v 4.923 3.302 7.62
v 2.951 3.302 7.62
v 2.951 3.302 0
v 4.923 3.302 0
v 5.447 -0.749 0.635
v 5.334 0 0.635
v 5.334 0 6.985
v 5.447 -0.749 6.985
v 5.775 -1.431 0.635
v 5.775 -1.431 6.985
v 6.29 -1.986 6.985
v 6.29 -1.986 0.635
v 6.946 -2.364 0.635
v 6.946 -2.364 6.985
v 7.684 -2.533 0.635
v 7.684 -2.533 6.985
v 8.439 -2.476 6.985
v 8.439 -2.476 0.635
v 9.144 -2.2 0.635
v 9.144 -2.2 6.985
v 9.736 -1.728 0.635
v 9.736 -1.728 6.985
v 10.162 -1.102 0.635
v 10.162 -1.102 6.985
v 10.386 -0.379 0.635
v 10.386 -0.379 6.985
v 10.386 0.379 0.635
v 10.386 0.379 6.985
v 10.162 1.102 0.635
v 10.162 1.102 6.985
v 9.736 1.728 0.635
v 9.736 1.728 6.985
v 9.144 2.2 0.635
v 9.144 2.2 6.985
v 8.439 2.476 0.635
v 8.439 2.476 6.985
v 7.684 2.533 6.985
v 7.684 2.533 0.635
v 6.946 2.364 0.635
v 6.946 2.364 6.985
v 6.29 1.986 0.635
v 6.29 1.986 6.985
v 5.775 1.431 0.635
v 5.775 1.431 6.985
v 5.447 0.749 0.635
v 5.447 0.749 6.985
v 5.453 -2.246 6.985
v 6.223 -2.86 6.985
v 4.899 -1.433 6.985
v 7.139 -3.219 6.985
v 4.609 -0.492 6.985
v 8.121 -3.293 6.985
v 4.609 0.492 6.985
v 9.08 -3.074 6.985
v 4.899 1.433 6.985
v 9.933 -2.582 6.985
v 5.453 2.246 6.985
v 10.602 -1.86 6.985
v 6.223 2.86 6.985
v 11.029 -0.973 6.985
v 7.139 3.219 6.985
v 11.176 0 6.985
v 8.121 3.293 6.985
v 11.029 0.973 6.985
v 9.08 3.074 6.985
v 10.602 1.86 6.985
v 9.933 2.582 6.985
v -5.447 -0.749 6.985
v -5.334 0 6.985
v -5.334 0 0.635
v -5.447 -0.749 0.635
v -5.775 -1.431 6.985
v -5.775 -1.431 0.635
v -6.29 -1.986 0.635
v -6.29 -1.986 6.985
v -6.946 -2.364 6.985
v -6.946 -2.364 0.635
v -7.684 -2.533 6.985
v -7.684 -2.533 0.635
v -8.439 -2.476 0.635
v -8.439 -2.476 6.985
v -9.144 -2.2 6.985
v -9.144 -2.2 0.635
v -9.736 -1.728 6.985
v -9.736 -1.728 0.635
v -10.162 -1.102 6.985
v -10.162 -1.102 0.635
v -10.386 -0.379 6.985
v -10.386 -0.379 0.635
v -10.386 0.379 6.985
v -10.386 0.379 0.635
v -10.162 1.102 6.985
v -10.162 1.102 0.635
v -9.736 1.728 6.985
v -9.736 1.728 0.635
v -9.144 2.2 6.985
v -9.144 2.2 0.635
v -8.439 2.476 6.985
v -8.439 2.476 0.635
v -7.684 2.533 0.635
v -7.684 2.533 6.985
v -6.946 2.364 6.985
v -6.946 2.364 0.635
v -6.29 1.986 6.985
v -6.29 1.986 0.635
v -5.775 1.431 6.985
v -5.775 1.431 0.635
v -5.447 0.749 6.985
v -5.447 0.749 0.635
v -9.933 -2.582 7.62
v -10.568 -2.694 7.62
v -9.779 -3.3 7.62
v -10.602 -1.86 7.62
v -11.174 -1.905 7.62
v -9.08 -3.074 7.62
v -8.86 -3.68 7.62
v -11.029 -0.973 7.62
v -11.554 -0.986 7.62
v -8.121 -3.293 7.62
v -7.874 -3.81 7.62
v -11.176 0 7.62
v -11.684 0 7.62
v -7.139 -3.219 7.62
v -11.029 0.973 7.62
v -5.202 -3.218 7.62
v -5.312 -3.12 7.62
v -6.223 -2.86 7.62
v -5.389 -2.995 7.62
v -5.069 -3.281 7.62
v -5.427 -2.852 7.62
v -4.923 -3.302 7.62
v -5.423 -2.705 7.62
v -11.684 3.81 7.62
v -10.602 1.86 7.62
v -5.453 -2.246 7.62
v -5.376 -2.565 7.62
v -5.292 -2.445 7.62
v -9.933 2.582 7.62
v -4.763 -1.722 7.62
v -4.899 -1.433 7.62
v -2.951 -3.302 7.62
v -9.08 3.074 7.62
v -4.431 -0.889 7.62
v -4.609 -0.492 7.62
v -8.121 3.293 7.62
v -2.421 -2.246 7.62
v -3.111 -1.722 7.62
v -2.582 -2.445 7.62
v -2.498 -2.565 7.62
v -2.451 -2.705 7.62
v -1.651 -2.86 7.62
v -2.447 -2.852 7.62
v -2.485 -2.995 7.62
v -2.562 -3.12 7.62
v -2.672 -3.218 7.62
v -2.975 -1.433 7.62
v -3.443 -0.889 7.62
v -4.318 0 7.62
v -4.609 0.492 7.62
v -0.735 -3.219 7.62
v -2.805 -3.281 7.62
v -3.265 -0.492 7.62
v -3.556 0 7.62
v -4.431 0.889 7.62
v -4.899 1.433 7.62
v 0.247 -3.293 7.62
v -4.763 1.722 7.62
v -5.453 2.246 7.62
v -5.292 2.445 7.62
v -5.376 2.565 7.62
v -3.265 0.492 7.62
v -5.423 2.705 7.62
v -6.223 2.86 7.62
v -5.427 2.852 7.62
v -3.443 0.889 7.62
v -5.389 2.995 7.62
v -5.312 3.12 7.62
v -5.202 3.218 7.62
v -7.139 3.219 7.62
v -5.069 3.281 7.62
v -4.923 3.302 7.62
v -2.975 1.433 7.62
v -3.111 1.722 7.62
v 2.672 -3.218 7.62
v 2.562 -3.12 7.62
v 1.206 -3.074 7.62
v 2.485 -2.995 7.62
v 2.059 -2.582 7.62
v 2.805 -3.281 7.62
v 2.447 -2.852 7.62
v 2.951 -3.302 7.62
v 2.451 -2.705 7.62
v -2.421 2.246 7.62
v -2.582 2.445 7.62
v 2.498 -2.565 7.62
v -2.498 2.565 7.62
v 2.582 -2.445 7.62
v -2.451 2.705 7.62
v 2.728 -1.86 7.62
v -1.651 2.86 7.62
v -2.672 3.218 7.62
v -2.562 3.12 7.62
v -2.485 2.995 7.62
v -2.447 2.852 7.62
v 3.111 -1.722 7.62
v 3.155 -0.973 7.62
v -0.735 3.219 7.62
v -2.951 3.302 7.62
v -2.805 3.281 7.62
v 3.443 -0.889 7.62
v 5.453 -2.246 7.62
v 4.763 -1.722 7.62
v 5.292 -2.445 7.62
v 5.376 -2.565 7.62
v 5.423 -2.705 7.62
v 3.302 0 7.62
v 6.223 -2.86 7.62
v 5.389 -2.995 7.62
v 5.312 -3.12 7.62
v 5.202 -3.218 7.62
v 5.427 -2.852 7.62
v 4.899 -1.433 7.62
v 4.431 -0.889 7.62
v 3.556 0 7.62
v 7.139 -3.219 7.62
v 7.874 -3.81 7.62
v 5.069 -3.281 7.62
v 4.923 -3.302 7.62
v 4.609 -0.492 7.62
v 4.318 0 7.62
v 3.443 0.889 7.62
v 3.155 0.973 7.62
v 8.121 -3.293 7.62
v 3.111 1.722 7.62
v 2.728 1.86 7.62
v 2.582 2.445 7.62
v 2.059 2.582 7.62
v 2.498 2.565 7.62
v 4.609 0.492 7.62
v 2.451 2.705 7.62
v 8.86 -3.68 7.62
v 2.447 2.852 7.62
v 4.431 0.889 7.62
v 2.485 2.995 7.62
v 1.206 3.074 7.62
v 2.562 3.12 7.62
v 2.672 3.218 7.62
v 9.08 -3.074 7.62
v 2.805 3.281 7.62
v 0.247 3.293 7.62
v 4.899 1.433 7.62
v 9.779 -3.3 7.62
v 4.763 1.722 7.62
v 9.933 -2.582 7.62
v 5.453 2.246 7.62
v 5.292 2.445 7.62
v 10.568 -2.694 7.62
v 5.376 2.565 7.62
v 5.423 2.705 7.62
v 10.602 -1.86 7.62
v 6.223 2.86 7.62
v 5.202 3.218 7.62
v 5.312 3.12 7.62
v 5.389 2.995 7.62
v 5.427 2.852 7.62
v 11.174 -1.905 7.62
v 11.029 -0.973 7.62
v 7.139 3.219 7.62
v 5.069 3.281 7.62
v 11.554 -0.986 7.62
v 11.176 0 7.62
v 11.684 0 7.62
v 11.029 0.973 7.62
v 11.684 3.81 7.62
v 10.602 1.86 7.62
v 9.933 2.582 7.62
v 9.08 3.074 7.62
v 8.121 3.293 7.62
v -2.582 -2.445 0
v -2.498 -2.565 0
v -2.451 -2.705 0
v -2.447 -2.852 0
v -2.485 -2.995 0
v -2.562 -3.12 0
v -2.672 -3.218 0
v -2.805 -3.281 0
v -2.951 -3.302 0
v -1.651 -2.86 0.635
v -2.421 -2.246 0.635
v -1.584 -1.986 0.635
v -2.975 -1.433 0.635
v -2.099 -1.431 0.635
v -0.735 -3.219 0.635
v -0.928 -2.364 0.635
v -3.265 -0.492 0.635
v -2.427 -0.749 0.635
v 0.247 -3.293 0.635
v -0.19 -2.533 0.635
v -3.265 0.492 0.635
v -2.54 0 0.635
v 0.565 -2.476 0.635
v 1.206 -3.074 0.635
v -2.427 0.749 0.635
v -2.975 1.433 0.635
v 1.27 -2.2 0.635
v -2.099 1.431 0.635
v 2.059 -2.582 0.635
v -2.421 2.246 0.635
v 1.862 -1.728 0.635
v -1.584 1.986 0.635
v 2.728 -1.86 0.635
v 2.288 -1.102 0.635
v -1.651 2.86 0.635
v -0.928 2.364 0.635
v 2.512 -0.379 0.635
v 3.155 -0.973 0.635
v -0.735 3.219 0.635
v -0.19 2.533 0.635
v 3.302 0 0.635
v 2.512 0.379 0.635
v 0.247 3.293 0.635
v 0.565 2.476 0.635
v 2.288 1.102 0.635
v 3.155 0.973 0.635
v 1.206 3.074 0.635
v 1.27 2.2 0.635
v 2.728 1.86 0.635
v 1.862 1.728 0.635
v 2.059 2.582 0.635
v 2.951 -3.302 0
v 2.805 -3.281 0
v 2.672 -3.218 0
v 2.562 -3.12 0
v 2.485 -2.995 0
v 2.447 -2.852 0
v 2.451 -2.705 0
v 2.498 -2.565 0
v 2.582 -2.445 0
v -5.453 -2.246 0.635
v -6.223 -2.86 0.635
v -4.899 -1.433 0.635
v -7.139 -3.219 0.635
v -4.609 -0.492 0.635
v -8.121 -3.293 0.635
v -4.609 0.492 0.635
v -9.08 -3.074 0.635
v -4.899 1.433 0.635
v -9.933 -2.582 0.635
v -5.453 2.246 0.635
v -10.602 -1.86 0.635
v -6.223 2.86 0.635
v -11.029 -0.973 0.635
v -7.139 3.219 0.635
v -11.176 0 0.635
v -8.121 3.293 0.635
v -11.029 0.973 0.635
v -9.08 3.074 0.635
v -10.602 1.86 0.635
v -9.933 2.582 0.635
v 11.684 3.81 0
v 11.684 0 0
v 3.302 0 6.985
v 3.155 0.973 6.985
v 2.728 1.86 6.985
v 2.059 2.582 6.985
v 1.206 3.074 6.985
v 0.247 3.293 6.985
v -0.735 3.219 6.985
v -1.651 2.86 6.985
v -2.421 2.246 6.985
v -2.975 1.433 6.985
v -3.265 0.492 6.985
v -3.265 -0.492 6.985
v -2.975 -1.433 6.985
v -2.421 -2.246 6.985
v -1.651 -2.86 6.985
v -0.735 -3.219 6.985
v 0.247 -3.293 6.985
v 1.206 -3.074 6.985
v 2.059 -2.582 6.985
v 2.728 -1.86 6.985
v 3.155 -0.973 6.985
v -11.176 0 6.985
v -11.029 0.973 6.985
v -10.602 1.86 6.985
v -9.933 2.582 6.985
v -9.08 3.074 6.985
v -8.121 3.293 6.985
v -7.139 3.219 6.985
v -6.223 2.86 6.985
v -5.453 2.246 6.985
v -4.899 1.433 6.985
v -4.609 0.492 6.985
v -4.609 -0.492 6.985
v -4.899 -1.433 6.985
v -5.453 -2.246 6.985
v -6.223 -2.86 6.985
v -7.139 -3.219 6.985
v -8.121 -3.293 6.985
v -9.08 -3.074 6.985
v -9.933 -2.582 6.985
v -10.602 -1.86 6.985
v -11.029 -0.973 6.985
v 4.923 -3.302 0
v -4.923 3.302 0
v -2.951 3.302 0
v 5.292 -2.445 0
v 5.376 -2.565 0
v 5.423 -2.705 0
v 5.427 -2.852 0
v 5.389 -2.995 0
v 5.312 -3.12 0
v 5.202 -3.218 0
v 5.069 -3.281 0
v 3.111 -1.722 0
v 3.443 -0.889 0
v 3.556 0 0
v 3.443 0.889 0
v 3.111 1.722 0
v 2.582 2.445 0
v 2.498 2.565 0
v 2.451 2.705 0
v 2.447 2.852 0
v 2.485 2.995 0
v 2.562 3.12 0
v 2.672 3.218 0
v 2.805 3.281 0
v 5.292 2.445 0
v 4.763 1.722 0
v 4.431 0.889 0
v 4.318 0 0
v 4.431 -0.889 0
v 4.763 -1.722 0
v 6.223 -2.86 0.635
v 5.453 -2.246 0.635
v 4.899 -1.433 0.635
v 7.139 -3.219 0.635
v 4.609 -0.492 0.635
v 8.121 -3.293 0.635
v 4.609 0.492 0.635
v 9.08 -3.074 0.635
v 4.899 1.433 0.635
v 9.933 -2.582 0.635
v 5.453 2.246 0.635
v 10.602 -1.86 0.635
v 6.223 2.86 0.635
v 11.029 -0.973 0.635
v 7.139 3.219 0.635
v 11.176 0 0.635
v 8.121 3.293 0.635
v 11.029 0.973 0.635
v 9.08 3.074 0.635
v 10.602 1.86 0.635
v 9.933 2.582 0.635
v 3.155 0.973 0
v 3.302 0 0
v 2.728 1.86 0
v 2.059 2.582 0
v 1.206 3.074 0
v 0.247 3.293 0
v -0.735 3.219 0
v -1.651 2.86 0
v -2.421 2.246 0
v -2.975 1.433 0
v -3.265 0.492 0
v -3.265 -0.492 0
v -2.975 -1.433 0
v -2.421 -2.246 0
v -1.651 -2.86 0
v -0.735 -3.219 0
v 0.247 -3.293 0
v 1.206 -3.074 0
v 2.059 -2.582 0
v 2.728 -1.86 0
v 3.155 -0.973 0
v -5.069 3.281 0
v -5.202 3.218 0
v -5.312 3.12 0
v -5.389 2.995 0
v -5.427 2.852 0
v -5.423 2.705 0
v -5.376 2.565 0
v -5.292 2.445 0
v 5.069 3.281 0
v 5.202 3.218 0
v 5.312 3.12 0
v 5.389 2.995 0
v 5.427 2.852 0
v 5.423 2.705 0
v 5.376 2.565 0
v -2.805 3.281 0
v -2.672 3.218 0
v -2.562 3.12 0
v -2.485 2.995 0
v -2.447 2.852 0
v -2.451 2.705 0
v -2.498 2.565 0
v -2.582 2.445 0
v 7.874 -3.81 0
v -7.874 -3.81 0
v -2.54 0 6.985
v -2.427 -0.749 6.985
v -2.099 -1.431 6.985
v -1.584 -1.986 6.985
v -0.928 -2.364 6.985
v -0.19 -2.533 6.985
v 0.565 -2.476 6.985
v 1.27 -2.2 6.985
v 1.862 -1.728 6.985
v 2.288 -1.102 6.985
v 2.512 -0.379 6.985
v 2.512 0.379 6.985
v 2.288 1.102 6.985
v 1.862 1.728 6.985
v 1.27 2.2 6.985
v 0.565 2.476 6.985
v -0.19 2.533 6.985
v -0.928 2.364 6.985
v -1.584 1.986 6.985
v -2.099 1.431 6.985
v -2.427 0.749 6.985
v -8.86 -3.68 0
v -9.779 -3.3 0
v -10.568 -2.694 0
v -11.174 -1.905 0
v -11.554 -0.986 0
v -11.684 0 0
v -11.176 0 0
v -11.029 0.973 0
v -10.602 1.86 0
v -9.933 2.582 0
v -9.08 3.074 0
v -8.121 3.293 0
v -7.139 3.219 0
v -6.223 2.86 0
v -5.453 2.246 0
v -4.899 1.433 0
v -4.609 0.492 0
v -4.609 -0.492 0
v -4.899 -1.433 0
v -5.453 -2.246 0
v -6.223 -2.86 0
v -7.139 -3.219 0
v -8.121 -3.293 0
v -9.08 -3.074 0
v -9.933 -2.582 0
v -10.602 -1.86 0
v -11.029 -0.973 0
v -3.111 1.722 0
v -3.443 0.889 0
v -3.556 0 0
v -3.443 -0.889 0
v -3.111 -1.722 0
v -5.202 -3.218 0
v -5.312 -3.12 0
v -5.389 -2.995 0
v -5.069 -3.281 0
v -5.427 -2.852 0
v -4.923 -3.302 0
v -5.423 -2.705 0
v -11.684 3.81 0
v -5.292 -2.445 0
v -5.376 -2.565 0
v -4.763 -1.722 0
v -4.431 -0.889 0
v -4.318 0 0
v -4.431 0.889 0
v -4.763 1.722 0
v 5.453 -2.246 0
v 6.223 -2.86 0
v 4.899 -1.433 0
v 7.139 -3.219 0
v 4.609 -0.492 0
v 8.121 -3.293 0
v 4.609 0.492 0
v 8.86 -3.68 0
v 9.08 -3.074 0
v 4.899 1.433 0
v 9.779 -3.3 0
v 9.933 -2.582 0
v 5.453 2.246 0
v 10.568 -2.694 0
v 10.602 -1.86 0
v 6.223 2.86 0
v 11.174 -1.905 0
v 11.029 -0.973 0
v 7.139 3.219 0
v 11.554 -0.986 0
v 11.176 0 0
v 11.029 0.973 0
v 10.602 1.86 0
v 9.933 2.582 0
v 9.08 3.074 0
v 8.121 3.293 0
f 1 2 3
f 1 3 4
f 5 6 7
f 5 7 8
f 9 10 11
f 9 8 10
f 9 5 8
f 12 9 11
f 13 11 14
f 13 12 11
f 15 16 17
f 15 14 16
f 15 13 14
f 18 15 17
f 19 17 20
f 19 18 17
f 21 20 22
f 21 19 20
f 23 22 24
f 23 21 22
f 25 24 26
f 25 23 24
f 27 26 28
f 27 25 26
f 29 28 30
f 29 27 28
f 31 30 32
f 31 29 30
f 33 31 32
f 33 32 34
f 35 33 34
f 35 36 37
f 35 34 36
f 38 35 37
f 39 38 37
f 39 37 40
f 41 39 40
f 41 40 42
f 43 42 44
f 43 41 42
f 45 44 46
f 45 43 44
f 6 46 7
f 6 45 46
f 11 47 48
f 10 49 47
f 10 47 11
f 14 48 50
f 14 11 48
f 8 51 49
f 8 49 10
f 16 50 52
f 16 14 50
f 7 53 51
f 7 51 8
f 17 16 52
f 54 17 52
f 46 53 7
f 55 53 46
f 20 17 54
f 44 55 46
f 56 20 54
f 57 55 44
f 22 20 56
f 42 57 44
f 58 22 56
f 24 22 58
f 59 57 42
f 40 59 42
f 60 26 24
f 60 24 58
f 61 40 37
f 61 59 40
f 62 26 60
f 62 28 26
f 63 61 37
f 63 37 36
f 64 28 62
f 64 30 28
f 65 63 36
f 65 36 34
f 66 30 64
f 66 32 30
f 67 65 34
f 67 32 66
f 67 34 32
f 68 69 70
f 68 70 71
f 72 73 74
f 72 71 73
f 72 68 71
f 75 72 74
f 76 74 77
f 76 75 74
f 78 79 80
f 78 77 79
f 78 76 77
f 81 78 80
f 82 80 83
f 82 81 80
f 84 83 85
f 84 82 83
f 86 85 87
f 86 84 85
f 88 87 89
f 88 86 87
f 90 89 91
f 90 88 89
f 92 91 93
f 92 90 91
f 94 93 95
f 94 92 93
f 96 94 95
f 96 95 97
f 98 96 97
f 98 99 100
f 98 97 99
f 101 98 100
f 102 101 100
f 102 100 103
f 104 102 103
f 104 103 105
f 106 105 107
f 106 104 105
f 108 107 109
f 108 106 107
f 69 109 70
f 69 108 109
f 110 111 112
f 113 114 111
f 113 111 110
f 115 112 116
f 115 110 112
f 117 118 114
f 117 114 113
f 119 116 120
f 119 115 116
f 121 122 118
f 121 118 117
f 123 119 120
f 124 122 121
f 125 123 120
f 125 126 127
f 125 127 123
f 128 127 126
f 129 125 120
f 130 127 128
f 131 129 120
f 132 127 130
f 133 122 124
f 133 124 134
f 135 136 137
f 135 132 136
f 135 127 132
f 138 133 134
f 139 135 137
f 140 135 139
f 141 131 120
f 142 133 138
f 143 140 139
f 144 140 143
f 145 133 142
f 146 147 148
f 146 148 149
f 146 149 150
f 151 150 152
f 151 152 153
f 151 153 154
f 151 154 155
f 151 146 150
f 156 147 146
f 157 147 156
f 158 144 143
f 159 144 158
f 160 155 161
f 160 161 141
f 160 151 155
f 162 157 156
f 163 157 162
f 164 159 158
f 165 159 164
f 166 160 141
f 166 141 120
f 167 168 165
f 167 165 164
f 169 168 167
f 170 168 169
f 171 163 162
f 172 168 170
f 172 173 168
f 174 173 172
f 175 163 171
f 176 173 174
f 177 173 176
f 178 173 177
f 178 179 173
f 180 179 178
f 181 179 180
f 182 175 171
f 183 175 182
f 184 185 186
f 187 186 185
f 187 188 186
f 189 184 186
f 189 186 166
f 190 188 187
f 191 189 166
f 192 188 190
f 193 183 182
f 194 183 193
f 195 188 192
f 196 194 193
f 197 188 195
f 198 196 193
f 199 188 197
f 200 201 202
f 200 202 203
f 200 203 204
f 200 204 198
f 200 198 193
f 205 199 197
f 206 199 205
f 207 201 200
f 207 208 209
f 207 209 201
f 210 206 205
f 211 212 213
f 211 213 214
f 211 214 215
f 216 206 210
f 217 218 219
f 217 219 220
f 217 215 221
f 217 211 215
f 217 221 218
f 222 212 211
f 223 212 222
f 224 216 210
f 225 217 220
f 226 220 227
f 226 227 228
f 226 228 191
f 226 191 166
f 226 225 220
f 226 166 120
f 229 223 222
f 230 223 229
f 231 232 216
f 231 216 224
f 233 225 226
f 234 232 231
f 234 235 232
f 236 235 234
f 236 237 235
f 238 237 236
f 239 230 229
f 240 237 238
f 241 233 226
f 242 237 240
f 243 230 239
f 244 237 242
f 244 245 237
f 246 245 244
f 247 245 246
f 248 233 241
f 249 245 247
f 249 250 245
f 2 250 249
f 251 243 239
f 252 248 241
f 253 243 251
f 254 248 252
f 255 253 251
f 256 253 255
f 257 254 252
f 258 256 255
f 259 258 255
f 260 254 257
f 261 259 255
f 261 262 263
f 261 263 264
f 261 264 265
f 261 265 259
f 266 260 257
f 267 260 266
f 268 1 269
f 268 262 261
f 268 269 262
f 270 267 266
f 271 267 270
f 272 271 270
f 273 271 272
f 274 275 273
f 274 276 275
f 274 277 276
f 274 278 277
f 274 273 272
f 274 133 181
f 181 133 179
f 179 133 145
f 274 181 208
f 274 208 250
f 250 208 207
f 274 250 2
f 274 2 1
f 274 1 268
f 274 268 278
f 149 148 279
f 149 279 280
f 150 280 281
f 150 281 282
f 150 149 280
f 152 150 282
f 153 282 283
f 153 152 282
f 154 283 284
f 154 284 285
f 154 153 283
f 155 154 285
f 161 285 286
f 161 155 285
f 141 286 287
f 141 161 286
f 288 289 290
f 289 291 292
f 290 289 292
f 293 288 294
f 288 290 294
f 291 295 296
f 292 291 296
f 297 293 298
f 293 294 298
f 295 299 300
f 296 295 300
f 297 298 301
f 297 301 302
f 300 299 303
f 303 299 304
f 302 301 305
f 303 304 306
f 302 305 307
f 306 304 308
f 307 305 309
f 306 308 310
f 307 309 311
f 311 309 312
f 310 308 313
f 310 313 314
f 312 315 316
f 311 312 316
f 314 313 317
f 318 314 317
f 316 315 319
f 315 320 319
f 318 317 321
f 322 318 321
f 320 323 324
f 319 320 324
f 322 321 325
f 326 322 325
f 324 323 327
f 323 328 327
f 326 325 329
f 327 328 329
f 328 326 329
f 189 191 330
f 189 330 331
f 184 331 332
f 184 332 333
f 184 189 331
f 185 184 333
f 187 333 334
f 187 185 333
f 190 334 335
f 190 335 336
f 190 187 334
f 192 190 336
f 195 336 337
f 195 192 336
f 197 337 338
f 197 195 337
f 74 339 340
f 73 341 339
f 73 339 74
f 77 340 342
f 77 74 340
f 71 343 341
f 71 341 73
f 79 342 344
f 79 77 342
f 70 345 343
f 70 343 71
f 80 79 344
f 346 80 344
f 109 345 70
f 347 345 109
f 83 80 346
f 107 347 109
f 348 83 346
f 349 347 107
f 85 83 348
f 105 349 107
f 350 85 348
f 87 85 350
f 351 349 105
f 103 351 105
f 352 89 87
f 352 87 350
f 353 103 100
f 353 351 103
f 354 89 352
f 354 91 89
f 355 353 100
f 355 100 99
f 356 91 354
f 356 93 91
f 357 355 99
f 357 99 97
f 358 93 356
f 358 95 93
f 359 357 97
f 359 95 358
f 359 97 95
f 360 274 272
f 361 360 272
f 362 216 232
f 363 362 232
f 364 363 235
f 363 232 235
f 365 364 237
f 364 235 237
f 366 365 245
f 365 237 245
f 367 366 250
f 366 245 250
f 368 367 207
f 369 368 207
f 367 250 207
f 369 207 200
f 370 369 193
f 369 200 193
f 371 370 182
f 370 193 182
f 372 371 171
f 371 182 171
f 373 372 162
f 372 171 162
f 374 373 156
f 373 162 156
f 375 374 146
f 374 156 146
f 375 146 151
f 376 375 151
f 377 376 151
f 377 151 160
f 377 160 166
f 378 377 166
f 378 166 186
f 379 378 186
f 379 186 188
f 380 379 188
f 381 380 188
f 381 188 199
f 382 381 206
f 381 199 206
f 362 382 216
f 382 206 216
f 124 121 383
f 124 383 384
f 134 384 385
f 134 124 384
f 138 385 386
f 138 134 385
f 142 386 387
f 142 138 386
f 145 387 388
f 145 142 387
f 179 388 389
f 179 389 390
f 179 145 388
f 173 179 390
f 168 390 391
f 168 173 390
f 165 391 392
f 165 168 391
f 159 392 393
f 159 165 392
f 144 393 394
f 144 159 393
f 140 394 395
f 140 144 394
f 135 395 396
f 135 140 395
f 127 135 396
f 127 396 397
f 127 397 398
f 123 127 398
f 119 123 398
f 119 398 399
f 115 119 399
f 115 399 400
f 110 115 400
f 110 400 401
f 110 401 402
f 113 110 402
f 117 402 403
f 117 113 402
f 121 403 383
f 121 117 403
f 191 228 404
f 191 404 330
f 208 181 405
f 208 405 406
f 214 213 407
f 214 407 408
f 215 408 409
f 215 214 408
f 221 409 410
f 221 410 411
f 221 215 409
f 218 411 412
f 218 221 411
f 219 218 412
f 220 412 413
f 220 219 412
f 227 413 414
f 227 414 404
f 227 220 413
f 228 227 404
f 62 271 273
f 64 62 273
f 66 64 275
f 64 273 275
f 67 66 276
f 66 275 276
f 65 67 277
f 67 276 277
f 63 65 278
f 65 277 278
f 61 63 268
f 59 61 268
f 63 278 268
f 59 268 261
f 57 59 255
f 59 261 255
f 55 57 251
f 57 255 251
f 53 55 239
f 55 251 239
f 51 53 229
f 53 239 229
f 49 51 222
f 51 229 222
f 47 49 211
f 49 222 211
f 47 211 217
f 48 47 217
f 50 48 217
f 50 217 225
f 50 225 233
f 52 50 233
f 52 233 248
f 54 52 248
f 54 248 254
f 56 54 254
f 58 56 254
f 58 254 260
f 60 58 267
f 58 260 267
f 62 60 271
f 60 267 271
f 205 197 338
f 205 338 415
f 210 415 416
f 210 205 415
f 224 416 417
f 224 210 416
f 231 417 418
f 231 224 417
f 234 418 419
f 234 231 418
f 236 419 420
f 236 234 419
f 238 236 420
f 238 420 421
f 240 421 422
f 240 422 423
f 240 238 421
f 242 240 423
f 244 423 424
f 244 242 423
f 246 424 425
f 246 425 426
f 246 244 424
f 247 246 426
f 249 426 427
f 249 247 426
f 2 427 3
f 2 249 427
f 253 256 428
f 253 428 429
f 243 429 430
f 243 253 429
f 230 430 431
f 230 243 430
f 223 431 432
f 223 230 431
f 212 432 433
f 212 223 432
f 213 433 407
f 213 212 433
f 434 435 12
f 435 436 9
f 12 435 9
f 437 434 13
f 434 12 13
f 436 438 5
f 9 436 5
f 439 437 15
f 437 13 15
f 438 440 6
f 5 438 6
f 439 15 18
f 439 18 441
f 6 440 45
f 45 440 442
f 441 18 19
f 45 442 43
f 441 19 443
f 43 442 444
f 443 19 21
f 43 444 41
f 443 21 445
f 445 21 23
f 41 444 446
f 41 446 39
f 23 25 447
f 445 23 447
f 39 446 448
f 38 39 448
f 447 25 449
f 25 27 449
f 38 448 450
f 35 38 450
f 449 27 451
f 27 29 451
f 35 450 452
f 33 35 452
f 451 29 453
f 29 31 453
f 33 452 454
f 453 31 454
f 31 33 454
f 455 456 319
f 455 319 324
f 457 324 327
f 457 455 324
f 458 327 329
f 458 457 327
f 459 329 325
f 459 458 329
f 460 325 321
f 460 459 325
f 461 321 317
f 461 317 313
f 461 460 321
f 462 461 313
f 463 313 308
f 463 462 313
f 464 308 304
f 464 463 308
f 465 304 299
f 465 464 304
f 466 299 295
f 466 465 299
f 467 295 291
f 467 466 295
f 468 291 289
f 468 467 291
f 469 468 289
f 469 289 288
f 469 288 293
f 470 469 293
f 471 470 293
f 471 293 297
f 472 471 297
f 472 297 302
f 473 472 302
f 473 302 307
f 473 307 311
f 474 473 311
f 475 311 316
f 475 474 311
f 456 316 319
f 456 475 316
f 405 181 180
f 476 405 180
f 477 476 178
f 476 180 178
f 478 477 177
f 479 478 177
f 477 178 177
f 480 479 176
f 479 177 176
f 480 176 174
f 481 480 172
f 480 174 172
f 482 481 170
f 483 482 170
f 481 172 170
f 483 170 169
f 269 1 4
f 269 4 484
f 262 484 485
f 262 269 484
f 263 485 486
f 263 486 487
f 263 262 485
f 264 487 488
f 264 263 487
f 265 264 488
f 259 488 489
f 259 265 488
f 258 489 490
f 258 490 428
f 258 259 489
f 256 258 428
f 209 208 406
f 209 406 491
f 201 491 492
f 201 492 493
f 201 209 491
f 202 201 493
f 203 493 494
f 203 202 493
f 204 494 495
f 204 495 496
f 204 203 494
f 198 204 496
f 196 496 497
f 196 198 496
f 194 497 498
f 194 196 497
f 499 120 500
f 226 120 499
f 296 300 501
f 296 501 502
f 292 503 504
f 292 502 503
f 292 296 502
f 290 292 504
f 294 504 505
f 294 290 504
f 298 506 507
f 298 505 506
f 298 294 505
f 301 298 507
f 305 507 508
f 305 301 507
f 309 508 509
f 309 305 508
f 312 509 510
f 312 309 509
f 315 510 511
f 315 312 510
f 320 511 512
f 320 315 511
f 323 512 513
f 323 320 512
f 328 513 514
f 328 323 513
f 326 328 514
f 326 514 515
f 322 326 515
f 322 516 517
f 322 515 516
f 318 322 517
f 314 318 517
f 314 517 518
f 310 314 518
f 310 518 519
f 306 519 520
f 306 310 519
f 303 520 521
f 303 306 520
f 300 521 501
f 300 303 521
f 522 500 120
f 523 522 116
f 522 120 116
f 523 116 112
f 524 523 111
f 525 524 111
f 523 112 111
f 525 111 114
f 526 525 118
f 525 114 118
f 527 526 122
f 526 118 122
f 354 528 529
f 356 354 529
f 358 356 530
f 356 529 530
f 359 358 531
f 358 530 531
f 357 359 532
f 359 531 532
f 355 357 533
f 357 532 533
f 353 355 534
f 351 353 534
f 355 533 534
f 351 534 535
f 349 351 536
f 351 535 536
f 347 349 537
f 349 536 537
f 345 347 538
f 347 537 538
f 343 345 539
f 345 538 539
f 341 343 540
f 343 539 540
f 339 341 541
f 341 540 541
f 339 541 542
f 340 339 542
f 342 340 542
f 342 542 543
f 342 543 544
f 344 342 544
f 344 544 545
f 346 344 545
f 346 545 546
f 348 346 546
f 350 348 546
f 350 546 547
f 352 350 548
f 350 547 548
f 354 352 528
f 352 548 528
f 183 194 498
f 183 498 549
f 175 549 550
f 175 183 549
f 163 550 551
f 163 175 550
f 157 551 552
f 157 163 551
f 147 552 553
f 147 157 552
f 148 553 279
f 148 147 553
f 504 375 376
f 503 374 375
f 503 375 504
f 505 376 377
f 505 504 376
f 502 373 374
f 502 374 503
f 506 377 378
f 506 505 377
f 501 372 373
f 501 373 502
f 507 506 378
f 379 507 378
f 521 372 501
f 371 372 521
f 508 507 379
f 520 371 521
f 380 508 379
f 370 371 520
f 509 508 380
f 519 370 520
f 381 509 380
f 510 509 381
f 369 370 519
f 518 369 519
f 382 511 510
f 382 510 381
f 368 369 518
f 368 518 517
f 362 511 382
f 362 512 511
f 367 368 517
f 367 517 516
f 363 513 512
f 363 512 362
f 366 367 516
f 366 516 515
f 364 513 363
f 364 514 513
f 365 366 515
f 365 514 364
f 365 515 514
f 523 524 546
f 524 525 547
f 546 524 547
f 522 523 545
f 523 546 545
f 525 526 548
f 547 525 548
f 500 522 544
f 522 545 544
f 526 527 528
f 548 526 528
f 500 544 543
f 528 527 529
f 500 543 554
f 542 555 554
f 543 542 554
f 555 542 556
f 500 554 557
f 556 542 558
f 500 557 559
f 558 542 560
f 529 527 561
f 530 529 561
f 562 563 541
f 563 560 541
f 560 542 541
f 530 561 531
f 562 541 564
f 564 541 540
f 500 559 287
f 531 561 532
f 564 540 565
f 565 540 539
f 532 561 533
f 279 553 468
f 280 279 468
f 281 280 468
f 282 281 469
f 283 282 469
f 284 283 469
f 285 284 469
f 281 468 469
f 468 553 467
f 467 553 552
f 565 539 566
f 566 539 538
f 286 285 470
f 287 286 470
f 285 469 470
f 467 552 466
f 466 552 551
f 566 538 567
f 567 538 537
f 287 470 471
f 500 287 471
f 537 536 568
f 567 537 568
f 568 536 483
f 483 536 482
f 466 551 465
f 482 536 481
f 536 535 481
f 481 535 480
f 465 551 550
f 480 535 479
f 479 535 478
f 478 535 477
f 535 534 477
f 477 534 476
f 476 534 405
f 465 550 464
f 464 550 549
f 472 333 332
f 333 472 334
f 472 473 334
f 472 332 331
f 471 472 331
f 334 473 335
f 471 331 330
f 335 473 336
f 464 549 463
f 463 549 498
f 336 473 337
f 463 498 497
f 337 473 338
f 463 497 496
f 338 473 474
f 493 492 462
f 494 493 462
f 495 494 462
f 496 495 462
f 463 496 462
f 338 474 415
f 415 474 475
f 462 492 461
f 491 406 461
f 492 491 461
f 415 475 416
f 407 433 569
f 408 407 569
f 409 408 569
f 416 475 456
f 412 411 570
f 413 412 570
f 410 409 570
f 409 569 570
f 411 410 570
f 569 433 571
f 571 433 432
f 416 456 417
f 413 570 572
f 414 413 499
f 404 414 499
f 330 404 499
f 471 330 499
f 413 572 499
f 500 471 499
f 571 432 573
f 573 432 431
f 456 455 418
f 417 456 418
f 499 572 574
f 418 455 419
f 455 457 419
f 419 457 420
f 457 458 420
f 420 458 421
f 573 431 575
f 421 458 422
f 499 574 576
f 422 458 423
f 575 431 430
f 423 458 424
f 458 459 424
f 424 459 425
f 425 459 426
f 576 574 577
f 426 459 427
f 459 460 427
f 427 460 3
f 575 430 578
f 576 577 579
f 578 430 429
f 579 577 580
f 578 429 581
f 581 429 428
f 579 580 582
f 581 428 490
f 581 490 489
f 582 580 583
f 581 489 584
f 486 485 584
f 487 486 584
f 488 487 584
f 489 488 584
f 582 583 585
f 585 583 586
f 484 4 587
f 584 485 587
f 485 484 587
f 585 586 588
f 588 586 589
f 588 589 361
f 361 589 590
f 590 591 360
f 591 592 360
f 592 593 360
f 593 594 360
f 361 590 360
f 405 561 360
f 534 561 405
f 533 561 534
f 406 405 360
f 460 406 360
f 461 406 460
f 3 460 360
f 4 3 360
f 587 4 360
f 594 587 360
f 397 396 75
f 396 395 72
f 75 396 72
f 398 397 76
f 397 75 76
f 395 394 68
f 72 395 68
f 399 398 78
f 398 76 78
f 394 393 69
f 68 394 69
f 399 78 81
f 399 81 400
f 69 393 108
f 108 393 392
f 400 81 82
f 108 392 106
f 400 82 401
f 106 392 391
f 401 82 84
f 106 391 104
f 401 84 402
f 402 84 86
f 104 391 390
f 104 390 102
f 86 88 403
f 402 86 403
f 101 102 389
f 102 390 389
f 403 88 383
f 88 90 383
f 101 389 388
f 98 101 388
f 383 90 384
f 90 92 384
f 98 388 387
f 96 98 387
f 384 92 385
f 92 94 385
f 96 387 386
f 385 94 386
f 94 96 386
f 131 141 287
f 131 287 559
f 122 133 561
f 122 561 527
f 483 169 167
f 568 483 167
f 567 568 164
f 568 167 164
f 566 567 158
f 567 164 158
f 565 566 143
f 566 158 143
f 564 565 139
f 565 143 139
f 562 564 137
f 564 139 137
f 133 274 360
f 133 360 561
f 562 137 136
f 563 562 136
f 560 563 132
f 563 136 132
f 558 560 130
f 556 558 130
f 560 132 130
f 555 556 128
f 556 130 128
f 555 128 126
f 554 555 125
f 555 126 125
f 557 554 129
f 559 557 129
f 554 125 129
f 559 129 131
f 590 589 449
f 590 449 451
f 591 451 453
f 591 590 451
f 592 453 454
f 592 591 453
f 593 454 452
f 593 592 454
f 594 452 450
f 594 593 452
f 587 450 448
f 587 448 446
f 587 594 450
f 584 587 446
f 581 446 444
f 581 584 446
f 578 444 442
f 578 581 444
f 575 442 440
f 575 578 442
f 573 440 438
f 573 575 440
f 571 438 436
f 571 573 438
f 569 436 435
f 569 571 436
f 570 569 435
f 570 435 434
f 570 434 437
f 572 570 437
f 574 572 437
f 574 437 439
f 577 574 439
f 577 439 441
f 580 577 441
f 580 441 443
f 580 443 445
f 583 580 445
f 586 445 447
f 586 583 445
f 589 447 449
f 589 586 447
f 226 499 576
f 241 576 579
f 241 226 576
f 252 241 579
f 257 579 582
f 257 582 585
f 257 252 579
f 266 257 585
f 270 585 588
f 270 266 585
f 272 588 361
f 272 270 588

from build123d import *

# Parameters (mm, degrees)
SKETCH1_R           = 3.302
SKETCH1_R_2         = 2.54
BOSS_EXTRUDE1_DEPTH = 3.81
SKETCH1_7_R         = 2.54
BOSS_EXTRUDE2_DEPTH = 3.81
SKETCH2_R           = 3.302
CUT_EXTRUDE1_DEPTH  = 0.635
BOSS_EXTRUDE3_DEPTH = 7.62


with BuildPart() as part:
    # Sketch1 → Boss-Extrude1 (new body)
    with BuildSketch(Plane.XY):
        with BuildLine():
            Line((3.937, -3.81), (7.874, -3.81))
            ThreePointArc((7.874, -3.81), (11.684, 0), (7.874, 3.81))
            Line((7.874, 3.81), (3.937, 3.81))
            Line((3.937, 3.81), (3.937, 3.302))
            Line((3.937, 3.302), (4.92278669, 3.302))
            ThreePointArc((4.92278669, 3.302), (5.389414486, 2.994804631), (5.291688354, 2.44475))
            ThreePointArc((5.291688354, 2.44475), (4.318, 0), (5.291688354, -2.44475))
            ThreePointArc((5.291688354, -2.44475), (5.389414486, -2.994804631), (4.92278669, -3.302))
            Line((4.92278669, -3.302), (3.937, -3.302))
            Line((3.937, -3.302), (3.937, -3.81))
        make_face()
        with Locations((7.874, 0)):
            Circle(SKETCH1_R, mode=Mode.SUBTRACT)
        with Locations((7.874, 0)):
            Circle(SKETCH1_R)
        with Locations(Location((7.874, 0, 0), (0, 0, 180))):
            Circle(SKETCH1_R_2, mode=Mode.SUBTRACT)
    extrude(amount=BOSS_EXTRUDE1_DEPTH)


with BuildPart() as body_2:
    # Sketch1_7 → Boss-Extrude2 (new body)
    with BuildSketch(Plane.XY):
        with BuildLine():
            Line((3.937, -3.81), (3.937, -3.302))
            Line((3.937, -3.302), (2.95121331, -3.302))
            ThreePointArc((2.95121331, -3.302), (2.484585514, -2.994804631), (2.582311646, -2.44475))
            ThreePointArc((2.582311646, -2.44475), (3.556, 0), (2.582311646, 2.44475))
            ThreePointArc((2.582311646, 2.44475), (2.484585514, 2.994804631), (2.95121331, 3.302))
            Line((2.95121331, 3.302), (3.937, 3.302))
            Line((3.937, 3.302), (3.937, 3.81))
            Line((3.937, 3.81), (-3.937, 3.81))
            Line((-3.937, 3.81), (-3.937, 3.302))
            Line((-3.937, 3.302), (-2.95121331, 3.302))
            ThreePointArc((-2.95121331, 3.302), (-2.484585514, 2.994804631), (-2.582311646, 2.44475))
            ThreePointArc((-2.582311646, 2.44475), (-3.556, 0), (-2.582311646, -2.44475))
            ThreePointArc((-2.582311646, -2.44475), (-2.484585514, -2.994804631), (-2.95121331, -3.302))
            Line((-2.95121331, -3.302), (-3.937, -3.302))
            Line((-3.937, -3.302), (-3.937, -3.81))
            Line((-3.937, -3.81), (3.937, -3.81))
        make_face()
        with Locations(Location((0, 0, 0), (0, 0, 180))):
            Circle(SKETCH1_7_R, mode=Mode.SUBTRACT)
    extrude(amount=BOSS_EXTRUDE2_DEPTH)


with BuildPart() as cut_extrude1_tool:
    # Sketch2 → Cut-Extrude1 (new body)
    with BuildSketch(Plane.XY):
        with Locations((7.874, 0)):
            Circle(SKETCH2_R)
        Circle(SKETCH2_R)
    extrude(amount=CUT_EXTRUDE1_DEPTH)


with BuildPart() as part_1:
    add(part.part)

    # Cut-Extrude1: cut by cut_extrude1_tool
    add(cut_extrude1_tool.part, mode=Mode.SUBTRACT)


with BuildPart() as body_2_1:
    add(body_2.part)

    # Cut-Extrude1: cut by cut_extrude1_tool
    add(cut_extrude1_tool.part, mode=Mode.SUBTRACT)


with BuildPart() as body_3:
    # Mirror2: mirrored copy
    add(part_1.part.mirror(Plane(origin=(0, 0, 0), x_dir=(0, 0, 1), z_dir=(1, 0, 0))))


with BuildPart() as part_2:
    add(part_1.part)

    # Combine1: union body 3, body 2
    add(body_3.part)
    add(body_2_1.part)

    # Mirror3: part across plane


with BuildPart() as part_3:
    add(part_2.part)
    add(part_2.part.mirror(Plane.XY.offset(3.81)))

    # Sketch3 → Boss-Extrude3 (add, through all)
    with BuildSketch(Plane.XY.offset(7.62)):
        with BuildLine():
            Line((7.874, 3.81), (11.684, 3.81))
            Line((11.684, 3.81), (11.684, 0))
            ThreePointArc((11.684, 0), (10.568076836, 2.694076836), (7.874, 3.81))
        make_face()
    boss_extrude3 = extrude(amount=-BOSS_EXTRUDE3_DEPTH)

    # Mirror4: Boss-Extrude3 across plane
    add(boss_extrude3.mirror(Plane(origin=(0, 0, 0), x_dir=(0, 0, 1), z_dir=(1, 0, 0))))


solid = part_3.part
